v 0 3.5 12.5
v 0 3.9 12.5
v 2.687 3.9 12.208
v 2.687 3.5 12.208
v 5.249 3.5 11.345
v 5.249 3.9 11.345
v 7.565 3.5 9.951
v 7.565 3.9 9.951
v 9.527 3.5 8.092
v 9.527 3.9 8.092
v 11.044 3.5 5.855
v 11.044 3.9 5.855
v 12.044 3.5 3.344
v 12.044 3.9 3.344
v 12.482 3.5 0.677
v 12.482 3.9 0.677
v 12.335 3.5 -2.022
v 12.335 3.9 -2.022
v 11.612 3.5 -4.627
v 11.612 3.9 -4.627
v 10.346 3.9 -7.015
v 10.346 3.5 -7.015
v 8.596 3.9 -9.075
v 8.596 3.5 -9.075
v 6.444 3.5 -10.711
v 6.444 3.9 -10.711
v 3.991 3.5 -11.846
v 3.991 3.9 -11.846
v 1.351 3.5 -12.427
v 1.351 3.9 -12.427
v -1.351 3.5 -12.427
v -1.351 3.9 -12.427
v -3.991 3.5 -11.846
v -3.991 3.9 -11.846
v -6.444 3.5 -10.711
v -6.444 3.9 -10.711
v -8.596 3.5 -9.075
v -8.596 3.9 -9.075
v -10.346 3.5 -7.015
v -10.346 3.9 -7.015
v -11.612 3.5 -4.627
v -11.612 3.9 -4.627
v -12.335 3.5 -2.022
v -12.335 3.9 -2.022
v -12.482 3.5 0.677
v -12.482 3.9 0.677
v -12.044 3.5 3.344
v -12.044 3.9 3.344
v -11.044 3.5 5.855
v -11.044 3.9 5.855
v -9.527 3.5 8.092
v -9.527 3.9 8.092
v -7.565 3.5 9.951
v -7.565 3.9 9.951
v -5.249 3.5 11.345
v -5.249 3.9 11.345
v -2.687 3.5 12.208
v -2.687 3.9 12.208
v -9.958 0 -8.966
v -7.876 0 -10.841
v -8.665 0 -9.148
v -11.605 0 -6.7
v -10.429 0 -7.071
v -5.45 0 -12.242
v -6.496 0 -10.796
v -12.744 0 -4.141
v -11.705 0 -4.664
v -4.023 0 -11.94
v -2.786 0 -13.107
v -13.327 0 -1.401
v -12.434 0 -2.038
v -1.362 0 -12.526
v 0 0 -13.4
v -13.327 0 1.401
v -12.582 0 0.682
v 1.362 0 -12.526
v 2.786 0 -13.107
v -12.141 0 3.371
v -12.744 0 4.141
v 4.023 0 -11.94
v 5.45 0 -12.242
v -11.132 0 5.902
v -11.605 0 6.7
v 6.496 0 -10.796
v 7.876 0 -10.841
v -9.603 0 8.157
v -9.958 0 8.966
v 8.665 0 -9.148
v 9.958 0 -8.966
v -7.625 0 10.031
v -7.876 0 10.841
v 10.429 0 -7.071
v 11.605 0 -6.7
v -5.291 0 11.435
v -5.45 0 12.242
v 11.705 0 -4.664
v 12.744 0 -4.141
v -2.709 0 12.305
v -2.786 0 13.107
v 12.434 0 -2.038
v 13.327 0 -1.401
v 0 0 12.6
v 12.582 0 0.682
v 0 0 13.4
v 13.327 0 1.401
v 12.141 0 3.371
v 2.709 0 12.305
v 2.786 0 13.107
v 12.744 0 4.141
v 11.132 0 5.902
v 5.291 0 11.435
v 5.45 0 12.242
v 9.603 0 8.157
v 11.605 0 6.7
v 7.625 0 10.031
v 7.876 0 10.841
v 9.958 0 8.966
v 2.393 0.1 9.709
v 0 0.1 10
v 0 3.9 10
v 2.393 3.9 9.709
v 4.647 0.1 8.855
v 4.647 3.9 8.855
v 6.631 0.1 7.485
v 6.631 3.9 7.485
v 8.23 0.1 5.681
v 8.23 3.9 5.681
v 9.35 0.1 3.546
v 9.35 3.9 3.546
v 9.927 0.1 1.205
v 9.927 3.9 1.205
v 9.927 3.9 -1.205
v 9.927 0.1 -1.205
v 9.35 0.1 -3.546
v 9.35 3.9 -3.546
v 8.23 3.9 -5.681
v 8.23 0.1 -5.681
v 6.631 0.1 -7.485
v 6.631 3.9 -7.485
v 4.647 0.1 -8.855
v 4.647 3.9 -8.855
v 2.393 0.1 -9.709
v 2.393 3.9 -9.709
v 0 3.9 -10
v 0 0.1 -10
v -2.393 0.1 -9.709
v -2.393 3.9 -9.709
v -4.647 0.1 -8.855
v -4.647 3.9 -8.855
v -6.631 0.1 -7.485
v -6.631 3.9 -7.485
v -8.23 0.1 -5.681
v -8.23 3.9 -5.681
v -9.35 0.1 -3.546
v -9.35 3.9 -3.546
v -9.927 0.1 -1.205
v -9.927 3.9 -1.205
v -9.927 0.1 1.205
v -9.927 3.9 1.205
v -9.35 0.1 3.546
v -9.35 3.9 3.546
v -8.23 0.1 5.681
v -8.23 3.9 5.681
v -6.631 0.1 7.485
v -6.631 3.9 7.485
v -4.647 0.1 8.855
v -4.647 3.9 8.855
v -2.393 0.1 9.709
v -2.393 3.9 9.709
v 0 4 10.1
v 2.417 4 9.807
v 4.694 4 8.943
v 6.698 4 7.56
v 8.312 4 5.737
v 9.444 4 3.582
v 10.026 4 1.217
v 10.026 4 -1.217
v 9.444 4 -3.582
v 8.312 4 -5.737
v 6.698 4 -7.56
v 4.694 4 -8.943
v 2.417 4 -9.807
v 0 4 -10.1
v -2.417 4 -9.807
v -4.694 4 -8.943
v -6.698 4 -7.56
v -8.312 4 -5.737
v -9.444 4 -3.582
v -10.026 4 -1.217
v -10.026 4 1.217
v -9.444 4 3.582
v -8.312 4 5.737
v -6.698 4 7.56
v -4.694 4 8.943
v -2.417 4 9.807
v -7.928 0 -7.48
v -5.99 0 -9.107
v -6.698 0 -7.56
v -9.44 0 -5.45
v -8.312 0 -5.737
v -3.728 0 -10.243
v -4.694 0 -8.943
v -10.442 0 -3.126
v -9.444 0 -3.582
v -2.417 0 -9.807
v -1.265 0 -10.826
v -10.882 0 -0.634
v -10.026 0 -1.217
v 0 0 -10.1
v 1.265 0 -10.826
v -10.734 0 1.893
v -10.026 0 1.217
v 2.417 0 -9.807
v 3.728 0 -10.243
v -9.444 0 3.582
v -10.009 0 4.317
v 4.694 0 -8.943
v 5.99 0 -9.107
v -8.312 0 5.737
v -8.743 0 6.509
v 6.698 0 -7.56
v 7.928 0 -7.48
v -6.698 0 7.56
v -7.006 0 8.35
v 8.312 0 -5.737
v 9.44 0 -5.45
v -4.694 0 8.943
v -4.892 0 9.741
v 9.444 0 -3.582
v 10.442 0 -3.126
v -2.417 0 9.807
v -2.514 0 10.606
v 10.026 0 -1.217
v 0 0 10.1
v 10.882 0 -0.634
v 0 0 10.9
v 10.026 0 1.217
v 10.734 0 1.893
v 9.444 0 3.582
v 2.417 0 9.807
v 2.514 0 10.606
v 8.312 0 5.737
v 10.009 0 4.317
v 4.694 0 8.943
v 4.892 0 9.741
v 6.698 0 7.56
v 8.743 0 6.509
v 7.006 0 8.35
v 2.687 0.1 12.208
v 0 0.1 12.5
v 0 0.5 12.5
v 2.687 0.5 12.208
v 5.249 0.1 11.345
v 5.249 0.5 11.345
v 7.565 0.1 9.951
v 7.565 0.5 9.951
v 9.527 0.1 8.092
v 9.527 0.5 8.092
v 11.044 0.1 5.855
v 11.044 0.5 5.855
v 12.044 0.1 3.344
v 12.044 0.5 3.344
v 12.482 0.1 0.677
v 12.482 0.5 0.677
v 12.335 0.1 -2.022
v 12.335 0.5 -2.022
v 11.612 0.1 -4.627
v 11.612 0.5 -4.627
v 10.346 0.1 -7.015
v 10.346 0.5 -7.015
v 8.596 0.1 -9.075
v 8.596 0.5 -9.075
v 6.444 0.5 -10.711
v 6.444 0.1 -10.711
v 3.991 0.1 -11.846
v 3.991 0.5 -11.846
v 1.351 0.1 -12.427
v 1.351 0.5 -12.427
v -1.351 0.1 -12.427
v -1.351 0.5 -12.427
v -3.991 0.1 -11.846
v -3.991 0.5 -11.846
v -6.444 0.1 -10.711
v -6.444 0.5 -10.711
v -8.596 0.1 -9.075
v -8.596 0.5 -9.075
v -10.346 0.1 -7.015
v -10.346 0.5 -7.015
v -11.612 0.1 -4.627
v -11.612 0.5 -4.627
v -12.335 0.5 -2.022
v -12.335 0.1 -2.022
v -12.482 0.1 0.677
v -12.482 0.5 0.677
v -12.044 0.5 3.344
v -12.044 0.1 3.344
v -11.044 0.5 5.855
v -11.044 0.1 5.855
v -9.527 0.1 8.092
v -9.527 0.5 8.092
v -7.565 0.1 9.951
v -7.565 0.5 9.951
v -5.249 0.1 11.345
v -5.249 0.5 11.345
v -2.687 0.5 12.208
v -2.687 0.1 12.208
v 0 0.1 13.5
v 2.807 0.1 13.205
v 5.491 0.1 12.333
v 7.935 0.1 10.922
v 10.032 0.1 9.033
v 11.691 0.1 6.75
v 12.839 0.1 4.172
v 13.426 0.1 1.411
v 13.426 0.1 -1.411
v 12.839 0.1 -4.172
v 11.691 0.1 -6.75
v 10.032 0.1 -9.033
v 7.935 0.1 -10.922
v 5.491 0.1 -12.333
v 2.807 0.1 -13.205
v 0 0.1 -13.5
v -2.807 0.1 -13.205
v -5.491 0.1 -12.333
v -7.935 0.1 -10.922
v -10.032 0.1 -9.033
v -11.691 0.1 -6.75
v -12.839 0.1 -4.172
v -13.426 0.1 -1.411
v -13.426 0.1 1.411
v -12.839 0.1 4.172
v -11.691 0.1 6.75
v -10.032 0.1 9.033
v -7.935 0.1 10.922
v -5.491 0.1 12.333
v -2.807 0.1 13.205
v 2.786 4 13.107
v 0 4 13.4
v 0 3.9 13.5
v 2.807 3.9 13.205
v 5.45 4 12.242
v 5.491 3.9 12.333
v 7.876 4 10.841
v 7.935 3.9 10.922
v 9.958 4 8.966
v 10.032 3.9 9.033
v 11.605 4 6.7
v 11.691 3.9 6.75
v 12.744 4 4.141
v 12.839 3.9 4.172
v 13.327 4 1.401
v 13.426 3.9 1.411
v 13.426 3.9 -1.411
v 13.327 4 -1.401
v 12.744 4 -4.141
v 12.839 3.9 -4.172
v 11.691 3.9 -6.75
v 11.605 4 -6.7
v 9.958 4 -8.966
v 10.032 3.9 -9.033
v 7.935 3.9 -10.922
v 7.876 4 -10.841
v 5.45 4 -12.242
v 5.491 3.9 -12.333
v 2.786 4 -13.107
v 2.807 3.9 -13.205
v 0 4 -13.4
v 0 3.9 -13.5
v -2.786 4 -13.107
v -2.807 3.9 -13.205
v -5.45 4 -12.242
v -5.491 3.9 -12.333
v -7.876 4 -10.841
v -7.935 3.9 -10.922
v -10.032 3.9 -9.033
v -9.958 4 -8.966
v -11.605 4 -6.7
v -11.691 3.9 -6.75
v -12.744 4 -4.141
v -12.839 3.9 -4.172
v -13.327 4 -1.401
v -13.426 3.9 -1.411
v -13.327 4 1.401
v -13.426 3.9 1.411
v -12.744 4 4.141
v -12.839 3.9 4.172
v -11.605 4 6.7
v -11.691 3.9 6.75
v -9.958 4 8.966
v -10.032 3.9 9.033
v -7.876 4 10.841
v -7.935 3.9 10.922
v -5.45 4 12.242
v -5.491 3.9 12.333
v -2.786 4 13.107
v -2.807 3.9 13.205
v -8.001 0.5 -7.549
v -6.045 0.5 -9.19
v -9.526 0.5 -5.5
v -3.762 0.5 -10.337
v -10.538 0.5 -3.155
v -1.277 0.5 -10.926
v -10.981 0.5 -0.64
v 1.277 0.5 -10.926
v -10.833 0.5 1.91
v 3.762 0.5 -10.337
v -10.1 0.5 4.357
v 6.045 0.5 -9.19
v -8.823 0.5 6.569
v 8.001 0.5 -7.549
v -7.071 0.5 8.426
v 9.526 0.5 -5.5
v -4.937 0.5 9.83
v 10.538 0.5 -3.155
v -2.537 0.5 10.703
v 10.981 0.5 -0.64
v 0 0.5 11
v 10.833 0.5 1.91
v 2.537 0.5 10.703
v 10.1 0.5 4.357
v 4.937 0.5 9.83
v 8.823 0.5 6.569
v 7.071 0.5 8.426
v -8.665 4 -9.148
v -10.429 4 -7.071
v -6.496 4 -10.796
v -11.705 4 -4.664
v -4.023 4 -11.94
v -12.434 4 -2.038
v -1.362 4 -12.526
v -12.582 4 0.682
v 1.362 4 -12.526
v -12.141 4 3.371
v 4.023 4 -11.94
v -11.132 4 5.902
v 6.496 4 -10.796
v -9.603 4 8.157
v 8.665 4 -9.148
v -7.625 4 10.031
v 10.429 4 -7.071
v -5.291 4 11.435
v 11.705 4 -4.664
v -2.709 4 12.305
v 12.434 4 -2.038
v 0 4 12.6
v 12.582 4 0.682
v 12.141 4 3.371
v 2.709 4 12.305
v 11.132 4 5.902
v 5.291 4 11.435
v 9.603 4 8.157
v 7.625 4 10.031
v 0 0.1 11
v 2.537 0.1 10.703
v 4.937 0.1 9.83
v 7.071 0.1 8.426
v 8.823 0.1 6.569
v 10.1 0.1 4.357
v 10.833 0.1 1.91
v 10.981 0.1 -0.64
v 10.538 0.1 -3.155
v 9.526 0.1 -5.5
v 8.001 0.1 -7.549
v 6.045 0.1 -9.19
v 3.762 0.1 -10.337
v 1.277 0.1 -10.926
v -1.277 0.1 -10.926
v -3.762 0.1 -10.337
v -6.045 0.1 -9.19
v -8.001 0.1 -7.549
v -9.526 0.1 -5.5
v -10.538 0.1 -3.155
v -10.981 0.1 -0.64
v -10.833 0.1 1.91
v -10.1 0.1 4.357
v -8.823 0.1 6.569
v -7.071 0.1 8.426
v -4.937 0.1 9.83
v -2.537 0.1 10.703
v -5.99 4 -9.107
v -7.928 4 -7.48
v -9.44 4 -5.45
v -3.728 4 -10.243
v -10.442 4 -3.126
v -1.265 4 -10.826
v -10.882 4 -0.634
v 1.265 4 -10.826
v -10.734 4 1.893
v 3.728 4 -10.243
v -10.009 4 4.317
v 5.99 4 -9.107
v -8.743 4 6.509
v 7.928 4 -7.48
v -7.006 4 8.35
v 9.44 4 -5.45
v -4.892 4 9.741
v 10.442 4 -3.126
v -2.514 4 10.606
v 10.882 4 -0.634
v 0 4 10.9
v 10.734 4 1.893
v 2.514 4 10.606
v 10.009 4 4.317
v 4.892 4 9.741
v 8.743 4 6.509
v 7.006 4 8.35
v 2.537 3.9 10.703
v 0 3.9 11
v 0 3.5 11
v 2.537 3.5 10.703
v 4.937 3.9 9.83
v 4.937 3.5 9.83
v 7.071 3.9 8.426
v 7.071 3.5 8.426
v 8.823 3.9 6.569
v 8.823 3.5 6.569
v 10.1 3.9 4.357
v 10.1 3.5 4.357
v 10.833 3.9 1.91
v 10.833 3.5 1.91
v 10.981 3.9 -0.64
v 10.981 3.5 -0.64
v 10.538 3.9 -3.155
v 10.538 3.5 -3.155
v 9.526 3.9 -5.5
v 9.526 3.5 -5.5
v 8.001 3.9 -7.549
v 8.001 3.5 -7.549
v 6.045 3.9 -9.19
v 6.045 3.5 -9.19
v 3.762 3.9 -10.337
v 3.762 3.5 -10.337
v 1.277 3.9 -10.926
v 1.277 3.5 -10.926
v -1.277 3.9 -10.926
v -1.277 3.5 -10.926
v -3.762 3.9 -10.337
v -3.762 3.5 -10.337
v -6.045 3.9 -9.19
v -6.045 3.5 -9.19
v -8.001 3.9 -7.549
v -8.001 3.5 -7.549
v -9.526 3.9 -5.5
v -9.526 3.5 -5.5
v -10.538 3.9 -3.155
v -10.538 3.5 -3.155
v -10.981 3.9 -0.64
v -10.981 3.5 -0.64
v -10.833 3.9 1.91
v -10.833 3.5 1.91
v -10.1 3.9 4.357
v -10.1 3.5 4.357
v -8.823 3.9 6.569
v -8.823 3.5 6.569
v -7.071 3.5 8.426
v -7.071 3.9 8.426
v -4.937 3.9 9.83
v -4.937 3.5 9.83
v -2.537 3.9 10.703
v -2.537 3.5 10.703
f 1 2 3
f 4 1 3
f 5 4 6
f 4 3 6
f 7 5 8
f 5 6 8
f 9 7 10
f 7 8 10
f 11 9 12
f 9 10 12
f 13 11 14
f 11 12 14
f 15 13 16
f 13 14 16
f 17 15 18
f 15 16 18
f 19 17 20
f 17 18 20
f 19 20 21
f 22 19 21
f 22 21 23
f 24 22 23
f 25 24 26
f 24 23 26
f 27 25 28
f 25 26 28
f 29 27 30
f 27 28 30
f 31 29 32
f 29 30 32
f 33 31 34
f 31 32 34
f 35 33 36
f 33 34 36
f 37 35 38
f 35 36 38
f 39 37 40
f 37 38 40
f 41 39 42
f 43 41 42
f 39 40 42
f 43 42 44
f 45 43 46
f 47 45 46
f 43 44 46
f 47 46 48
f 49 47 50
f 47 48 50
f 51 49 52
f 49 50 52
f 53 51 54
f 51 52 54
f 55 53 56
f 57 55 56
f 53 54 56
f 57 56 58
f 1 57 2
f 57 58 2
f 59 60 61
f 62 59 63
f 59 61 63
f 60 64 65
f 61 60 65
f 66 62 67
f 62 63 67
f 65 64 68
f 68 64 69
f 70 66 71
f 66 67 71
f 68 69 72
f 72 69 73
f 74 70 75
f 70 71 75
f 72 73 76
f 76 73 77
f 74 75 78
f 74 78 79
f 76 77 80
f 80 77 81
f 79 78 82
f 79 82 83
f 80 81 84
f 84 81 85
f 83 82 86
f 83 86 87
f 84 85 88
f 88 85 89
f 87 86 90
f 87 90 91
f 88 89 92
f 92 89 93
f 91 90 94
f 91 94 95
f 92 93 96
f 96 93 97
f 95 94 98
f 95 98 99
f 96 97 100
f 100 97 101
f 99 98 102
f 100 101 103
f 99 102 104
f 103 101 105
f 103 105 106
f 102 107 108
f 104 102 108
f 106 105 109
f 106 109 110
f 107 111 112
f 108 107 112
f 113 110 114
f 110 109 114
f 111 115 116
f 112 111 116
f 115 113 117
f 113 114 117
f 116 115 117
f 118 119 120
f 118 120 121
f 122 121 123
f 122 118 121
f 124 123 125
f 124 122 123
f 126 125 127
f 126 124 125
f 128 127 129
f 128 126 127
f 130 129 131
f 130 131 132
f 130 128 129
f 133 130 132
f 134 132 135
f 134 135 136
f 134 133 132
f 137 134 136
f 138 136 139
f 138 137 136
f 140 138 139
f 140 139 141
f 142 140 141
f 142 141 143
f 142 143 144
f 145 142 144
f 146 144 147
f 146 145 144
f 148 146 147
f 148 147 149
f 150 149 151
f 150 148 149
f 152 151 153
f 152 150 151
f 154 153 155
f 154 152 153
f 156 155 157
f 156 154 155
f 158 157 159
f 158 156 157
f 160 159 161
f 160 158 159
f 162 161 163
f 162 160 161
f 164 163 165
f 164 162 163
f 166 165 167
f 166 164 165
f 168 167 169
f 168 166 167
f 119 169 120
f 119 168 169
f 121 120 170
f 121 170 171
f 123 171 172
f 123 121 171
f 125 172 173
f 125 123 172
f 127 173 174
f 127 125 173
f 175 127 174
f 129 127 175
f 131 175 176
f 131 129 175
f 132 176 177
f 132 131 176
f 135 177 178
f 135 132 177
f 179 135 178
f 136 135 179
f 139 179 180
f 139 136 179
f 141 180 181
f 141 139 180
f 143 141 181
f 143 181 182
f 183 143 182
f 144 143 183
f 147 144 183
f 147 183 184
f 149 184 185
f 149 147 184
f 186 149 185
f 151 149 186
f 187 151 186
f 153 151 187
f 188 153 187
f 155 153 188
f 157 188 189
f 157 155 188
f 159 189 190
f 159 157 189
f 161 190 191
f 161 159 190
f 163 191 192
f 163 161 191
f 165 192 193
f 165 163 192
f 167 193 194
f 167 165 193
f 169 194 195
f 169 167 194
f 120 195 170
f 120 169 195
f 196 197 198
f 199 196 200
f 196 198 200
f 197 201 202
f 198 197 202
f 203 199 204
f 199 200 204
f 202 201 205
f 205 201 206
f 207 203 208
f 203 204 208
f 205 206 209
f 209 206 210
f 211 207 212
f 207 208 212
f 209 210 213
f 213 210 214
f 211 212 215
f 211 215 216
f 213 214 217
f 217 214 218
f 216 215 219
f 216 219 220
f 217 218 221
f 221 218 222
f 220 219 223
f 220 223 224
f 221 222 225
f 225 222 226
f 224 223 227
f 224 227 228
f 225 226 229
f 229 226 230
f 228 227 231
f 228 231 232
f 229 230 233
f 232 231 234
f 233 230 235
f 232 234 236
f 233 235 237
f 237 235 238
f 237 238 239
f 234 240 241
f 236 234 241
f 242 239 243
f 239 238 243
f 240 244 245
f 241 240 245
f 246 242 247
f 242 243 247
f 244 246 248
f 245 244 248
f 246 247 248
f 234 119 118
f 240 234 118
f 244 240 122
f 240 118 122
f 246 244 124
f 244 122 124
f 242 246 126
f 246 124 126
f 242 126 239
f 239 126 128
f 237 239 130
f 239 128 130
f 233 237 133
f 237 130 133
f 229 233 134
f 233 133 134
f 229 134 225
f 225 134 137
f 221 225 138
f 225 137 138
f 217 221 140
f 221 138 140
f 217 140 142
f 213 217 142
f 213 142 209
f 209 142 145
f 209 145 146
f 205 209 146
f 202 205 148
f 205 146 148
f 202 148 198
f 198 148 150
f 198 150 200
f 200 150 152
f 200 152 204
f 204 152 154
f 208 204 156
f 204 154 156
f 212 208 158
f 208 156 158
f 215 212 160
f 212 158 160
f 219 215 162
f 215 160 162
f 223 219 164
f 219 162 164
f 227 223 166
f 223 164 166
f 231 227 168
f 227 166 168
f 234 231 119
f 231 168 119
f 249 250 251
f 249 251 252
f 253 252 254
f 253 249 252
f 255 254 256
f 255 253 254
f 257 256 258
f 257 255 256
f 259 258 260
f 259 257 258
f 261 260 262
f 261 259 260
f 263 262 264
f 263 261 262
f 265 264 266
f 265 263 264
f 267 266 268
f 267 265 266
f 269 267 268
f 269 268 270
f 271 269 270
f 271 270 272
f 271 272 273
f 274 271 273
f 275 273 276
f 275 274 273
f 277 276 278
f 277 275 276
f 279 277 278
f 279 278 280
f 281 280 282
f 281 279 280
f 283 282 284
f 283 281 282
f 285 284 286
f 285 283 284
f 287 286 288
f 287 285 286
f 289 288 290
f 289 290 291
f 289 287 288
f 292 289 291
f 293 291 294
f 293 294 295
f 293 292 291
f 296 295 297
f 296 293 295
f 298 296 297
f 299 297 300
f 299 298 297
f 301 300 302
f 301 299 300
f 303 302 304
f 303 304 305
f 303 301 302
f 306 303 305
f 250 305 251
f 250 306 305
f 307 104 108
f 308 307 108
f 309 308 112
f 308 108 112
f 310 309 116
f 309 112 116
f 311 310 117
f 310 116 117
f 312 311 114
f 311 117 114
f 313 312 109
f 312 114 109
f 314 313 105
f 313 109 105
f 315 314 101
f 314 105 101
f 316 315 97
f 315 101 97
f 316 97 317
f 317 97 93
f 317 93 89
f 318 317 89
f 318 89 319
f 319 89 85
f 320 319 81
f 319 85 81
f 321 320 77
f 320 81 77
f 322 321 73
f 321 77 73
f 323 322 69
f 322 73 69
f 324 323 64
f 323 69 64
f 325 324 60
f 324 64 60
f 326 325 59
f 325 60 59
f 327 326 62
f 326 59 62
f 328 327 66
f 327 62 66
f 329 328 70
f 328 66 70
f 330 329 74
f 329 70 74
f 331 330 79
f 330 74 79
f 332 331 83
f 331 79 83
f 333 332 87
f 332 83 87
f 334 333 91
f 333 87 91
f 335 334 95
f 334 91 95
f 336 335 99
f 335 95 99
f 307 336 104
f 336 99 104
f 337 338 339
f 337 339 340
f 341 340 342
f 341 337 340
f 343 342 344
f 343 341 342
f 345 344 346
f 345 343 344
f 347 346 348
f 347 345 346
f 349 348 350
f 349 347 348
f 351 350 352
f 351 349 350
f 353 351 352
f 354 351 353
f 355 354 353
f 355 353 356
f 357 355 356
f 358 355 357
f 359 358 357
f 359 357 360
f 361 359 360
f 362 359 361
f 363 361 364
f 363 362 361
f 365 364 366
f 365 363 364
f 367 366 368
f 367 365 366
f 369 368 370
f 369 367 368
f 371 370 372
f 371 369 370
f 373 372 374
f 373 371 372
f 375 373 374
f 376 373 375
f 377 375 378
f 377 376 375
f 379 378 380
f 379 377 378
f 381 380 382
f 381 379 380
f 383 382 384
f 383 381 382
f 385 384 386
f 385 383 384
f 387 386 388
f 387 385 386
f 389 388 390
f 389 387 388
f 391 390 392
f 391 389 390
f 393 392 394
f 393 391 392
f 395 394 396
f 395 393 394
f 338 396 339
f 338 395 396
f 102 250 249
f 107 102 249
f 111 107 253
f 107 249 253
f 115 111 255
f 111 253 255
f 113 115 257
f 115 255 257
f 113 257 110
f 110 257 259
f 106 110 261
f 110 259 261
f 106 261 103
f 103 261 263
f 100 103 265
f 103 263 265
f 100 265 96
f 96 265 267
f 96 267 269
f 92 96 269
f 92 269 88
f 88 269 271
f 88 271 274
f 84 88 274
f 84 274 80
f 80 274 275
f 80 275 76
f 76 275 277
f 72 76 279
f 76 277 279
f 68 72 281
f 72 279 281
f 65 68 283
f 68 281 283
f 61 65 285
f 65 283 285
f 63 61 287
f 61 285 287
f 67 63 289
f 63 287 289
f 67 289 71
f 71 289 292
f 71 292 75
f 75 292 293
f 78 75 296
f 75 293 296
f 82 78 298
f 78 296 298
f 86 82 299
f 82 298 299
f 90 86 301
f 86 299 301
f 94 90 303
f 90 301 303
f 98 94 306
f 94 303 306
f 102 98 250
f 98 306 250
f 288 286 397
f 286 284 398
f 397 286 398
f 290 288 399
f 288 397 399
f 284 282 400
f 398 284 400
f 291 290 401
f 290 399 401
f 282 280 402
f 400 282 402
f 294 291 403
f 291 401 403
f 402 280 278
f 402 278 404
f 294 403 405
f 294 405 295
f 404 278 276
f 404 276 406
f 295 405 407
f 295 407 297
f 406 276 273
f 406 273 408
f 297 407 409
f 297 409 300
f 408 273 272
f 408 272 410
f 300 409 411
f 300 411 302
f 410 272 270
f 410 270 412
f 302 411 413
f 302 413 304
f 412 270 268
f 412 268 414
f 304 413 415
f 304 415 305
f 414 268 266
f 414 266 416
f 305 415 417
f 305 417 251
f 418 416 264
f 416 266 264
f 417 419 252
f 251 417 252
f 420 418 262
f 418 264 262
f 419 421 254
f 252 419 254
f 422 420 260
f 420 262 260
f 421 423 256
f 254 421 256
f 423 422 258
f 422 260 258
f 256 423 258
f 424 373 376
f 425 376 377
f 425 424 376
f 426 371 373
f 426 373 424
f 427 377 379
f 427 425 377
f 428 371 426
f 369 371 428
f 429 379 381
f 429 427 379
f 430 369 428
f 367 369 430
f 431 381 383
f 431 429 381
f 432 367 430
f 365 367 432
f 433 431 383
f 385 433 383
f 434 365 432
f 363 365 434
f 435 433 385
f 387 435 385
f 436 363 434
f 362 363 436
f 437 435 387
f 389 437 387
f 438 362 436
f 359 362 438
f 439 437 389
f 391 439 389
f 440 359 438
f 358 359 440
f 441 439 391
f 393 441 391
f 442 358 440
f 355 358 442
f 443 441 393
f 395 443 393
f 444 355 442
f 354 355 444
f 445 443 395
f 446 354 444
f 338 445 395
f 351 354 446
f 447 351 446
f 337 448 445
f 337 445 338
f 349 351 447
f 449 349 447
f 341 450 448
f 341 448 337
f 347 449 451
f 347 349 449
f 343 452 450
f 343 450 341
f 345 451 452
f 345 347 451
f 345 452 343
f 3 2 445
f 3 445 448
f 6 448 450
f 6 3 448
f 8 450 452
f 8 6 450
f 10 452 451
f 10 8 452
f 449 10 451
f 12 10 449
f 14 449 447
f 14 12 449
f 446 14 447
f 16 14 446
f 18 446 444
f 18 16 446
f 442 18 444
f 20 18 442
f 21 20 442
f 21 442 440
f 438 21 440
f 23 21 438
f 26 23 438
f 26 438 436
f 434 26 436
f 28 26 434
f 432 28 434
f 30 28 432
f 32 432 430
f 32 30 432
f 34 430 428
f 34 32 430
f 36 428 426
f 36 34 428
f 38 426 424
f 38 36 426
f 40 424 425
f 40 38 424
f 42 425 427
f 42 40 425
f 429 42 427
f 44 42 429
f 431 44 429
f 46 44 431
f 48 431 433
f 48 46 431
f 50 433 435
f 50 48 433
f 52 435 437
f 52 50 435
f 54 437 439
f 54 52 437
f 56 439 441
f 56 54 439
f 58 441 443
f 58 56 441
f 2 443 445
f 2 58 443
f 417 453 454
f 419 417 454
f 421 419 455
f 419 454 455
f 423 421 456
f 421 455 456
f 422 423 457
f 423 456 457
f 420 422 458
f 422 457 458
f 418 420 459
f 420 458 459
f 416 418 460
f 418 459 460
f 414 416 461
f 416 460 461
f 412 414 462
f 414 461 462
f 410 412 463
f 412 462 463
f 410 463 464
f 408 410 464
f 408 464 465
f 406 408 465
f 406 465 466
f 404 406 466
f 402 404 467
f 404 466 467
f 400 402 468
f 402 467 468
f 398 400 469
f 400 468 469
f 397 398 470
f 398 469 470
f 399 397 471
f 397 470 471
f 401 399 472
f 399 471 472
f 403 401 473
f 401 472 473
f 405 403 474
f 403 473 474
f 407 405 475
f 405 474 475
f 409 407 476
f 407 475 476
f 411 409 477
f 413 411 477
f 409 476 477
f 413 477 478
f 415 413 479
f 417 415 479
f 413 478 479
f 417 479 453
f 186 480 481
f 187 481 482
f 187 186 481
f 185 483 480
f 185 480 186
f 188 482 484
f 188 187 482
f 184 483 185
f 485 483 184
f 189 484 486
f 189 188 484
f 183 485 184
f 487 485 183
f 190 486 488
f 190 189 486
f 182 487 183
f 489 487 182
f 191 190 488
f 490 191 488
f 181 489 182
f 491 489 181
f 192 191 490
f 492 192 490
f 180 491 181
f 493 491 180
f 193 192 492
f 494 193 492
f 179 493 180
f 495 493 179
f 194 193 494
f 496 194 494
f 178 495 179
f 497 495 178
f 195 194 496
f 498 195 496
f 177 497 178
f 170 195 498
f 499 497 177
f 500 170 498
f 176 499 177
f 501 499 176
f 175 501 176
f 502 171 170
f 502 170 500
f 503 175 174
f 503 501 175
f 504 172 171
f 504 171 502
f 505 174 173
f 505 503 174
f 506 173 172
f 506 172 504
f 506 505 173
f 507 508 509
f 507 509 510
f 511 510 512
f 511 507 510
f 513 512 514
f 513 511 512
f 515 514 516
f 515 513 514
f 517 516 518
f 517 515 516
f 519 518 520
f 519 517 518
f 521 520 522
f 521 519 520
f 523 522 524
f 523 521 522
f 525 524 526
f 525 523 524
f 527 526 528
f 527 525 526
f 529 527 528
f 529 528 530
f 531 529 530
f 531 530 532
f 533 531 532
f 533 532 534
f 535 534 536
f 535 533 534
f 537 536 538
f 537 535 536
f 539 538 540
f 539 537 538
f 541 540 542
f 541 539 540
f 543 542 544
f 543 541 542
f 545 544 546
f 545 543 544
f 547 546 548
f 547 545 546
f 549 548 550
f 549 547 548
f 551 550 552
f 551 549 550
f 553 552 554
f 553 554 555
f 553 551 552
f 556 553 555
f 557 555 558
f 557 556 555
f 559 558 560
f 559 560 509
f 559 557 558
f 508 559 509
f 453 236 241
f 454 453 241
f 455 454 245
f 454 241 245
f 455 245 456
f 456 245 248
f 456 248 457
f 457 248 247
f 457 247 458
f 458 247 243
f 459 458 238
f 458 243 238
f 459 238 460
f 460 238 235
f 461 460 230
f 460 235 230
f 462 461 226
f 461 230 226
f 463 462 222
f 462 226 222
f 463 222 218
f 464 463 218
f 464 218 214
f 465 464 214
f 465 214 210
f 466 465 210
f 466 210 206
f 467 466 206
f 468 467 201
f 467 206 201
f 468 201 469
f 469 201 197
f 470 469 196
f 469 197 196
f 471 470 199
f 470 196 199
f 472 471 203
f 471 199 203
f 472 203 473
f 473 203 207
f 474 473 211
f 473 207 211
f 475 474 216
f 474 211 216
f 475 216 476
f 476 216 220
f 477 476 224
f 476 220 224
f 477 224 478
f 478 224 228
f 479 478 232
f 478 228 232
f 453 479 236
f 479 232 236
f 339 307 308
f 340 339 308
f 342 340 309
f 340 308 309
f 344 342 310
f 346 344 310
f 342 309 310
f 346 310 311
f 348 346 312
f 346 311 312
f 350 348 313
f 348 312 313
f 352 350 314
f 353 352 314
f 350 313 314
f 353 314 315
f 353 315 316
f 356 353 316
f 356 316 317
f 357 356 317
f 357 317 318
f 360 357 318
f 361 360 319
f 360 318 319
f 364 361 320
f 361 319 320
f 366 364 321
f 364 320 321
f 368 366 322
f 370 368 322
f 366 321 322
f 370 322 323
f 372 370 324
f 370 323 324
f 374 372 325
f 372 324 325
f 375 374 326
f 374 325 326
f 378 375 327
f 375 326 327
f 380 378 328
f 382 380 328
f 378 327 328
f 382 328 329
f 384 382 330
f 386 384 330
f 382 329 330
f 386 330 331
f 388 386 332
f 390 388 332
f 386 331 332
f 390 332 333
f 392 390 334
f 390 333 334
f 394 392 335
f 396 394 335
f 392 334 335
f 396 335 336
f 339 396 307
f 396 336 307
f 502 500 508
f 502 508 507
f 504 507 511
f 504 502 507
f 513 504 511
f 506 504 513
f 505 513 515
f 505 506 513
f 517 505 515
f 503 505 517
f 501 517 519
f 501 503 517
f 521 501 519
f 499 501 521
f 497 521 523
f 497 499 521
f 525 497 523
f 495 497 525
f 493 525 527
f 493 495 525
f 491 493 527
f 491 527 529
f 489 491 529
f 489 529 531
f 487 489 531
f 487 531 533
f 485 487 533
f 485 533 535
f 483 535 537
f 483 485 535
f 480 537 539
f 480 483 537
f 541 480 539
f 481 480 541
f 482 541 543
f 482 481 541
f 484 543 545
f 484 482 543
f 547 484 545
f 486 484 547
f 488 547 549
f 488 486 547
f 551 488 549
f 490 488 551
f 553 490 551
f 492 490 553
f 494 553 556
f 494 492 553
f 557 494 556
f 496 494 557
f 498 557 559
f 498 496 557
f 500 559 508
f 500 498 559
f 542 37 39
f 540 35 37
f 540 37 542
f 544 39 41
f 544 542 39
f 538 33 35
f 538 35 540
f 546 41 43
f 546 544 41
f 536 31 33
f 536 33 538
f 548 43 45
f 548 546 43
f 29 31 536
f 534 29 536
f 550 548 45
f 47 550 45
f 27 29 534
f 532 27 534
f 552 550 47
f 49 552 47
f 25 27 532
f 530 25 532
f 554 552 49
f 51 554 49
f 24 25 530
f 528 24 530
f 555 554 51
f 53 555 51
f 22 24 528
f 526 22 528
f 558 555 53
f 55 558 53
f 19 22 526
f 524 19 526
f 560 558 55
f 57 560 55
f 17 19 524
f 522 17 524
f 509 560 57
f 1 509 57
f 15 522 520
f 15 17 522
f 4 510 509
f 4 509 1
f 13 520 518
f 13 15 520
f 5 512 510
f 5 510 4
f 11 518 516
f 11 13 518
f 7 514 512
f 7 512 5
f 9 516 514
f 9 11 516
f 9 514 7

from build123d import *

# Parameters (mm, degrees)
SKETCH_1_R          = 13.5
SKETCH_1_R_2        = 10
EXTRUDE_1_DEPTH     = 4
SKETCH_2_R          = 12.5
SKETCH_2_R_2        = 11
CUT_EXTRUDE_1_DEPTH = 0.5
CHAMFER_1_SIZE      = 0.1


with BuildPart() as part:
    # 草图1 → 凸台-拉伸1 (new body)
    with BuildSketch(Plane(origin=(0, 0, 0), x_dir=(1, 0, 0), z_dir=(0, 1, 0))):
        with Locations(Location((0, 0, 0), (0, 0, 270))):
            Circle(SKETCH_1_R)
        with Locations(Location((0, 0, 0), (0, 0, 270))):
            Circle(SKETCH_1_R_2, mode=Mode.SUBTRACT)
    extrude(amount=EXTRUDE_1_DEPTH)

    # 草图2 → 切除-拉伸1 (cut)
    with BuildSketch(Plane(origin=(0, 4, 0), x_dir=(1, 0, 0), z_dir=(0, 1, 0))):
        with Locations(Location((0, 0, 0), (0, 0, 270))):
            Circle(SKETCH_2_R)
        with Locations(Location((0, 0, 0), (0, 0, 270))):
            Circle(SKETCH_2_R_2, mode=Mode.SUBTRACT)
    cut_extrude_1 = extrude(amount=-CUT_EXTRUDE_1_DEPTH, mode=Mode.SUBTRACT)

    # 镜向1: 切除-拉伸1 across plane
    add(cut_extrude_1.mirror(Plane.ZX.offset(2)), mode=Mode.SUBTRACT)

    # 倒角1
    chamfer_1_edges = [part.edges().sort_by_distance(p)[0] for p in [
        (0, 4, -12.5),
        (0, 4, -11),
        (0, 0, -11),
        (0, 0, -12.5),
        (0, 0, -13.5),
        (0, 4, -13.5),
        (0, 0, -10),
        (0, 4, -10),
    ]]
    chamfer(chamfer_1_edges, length=CHAMFER_1_SIZE)


solid = part.part
